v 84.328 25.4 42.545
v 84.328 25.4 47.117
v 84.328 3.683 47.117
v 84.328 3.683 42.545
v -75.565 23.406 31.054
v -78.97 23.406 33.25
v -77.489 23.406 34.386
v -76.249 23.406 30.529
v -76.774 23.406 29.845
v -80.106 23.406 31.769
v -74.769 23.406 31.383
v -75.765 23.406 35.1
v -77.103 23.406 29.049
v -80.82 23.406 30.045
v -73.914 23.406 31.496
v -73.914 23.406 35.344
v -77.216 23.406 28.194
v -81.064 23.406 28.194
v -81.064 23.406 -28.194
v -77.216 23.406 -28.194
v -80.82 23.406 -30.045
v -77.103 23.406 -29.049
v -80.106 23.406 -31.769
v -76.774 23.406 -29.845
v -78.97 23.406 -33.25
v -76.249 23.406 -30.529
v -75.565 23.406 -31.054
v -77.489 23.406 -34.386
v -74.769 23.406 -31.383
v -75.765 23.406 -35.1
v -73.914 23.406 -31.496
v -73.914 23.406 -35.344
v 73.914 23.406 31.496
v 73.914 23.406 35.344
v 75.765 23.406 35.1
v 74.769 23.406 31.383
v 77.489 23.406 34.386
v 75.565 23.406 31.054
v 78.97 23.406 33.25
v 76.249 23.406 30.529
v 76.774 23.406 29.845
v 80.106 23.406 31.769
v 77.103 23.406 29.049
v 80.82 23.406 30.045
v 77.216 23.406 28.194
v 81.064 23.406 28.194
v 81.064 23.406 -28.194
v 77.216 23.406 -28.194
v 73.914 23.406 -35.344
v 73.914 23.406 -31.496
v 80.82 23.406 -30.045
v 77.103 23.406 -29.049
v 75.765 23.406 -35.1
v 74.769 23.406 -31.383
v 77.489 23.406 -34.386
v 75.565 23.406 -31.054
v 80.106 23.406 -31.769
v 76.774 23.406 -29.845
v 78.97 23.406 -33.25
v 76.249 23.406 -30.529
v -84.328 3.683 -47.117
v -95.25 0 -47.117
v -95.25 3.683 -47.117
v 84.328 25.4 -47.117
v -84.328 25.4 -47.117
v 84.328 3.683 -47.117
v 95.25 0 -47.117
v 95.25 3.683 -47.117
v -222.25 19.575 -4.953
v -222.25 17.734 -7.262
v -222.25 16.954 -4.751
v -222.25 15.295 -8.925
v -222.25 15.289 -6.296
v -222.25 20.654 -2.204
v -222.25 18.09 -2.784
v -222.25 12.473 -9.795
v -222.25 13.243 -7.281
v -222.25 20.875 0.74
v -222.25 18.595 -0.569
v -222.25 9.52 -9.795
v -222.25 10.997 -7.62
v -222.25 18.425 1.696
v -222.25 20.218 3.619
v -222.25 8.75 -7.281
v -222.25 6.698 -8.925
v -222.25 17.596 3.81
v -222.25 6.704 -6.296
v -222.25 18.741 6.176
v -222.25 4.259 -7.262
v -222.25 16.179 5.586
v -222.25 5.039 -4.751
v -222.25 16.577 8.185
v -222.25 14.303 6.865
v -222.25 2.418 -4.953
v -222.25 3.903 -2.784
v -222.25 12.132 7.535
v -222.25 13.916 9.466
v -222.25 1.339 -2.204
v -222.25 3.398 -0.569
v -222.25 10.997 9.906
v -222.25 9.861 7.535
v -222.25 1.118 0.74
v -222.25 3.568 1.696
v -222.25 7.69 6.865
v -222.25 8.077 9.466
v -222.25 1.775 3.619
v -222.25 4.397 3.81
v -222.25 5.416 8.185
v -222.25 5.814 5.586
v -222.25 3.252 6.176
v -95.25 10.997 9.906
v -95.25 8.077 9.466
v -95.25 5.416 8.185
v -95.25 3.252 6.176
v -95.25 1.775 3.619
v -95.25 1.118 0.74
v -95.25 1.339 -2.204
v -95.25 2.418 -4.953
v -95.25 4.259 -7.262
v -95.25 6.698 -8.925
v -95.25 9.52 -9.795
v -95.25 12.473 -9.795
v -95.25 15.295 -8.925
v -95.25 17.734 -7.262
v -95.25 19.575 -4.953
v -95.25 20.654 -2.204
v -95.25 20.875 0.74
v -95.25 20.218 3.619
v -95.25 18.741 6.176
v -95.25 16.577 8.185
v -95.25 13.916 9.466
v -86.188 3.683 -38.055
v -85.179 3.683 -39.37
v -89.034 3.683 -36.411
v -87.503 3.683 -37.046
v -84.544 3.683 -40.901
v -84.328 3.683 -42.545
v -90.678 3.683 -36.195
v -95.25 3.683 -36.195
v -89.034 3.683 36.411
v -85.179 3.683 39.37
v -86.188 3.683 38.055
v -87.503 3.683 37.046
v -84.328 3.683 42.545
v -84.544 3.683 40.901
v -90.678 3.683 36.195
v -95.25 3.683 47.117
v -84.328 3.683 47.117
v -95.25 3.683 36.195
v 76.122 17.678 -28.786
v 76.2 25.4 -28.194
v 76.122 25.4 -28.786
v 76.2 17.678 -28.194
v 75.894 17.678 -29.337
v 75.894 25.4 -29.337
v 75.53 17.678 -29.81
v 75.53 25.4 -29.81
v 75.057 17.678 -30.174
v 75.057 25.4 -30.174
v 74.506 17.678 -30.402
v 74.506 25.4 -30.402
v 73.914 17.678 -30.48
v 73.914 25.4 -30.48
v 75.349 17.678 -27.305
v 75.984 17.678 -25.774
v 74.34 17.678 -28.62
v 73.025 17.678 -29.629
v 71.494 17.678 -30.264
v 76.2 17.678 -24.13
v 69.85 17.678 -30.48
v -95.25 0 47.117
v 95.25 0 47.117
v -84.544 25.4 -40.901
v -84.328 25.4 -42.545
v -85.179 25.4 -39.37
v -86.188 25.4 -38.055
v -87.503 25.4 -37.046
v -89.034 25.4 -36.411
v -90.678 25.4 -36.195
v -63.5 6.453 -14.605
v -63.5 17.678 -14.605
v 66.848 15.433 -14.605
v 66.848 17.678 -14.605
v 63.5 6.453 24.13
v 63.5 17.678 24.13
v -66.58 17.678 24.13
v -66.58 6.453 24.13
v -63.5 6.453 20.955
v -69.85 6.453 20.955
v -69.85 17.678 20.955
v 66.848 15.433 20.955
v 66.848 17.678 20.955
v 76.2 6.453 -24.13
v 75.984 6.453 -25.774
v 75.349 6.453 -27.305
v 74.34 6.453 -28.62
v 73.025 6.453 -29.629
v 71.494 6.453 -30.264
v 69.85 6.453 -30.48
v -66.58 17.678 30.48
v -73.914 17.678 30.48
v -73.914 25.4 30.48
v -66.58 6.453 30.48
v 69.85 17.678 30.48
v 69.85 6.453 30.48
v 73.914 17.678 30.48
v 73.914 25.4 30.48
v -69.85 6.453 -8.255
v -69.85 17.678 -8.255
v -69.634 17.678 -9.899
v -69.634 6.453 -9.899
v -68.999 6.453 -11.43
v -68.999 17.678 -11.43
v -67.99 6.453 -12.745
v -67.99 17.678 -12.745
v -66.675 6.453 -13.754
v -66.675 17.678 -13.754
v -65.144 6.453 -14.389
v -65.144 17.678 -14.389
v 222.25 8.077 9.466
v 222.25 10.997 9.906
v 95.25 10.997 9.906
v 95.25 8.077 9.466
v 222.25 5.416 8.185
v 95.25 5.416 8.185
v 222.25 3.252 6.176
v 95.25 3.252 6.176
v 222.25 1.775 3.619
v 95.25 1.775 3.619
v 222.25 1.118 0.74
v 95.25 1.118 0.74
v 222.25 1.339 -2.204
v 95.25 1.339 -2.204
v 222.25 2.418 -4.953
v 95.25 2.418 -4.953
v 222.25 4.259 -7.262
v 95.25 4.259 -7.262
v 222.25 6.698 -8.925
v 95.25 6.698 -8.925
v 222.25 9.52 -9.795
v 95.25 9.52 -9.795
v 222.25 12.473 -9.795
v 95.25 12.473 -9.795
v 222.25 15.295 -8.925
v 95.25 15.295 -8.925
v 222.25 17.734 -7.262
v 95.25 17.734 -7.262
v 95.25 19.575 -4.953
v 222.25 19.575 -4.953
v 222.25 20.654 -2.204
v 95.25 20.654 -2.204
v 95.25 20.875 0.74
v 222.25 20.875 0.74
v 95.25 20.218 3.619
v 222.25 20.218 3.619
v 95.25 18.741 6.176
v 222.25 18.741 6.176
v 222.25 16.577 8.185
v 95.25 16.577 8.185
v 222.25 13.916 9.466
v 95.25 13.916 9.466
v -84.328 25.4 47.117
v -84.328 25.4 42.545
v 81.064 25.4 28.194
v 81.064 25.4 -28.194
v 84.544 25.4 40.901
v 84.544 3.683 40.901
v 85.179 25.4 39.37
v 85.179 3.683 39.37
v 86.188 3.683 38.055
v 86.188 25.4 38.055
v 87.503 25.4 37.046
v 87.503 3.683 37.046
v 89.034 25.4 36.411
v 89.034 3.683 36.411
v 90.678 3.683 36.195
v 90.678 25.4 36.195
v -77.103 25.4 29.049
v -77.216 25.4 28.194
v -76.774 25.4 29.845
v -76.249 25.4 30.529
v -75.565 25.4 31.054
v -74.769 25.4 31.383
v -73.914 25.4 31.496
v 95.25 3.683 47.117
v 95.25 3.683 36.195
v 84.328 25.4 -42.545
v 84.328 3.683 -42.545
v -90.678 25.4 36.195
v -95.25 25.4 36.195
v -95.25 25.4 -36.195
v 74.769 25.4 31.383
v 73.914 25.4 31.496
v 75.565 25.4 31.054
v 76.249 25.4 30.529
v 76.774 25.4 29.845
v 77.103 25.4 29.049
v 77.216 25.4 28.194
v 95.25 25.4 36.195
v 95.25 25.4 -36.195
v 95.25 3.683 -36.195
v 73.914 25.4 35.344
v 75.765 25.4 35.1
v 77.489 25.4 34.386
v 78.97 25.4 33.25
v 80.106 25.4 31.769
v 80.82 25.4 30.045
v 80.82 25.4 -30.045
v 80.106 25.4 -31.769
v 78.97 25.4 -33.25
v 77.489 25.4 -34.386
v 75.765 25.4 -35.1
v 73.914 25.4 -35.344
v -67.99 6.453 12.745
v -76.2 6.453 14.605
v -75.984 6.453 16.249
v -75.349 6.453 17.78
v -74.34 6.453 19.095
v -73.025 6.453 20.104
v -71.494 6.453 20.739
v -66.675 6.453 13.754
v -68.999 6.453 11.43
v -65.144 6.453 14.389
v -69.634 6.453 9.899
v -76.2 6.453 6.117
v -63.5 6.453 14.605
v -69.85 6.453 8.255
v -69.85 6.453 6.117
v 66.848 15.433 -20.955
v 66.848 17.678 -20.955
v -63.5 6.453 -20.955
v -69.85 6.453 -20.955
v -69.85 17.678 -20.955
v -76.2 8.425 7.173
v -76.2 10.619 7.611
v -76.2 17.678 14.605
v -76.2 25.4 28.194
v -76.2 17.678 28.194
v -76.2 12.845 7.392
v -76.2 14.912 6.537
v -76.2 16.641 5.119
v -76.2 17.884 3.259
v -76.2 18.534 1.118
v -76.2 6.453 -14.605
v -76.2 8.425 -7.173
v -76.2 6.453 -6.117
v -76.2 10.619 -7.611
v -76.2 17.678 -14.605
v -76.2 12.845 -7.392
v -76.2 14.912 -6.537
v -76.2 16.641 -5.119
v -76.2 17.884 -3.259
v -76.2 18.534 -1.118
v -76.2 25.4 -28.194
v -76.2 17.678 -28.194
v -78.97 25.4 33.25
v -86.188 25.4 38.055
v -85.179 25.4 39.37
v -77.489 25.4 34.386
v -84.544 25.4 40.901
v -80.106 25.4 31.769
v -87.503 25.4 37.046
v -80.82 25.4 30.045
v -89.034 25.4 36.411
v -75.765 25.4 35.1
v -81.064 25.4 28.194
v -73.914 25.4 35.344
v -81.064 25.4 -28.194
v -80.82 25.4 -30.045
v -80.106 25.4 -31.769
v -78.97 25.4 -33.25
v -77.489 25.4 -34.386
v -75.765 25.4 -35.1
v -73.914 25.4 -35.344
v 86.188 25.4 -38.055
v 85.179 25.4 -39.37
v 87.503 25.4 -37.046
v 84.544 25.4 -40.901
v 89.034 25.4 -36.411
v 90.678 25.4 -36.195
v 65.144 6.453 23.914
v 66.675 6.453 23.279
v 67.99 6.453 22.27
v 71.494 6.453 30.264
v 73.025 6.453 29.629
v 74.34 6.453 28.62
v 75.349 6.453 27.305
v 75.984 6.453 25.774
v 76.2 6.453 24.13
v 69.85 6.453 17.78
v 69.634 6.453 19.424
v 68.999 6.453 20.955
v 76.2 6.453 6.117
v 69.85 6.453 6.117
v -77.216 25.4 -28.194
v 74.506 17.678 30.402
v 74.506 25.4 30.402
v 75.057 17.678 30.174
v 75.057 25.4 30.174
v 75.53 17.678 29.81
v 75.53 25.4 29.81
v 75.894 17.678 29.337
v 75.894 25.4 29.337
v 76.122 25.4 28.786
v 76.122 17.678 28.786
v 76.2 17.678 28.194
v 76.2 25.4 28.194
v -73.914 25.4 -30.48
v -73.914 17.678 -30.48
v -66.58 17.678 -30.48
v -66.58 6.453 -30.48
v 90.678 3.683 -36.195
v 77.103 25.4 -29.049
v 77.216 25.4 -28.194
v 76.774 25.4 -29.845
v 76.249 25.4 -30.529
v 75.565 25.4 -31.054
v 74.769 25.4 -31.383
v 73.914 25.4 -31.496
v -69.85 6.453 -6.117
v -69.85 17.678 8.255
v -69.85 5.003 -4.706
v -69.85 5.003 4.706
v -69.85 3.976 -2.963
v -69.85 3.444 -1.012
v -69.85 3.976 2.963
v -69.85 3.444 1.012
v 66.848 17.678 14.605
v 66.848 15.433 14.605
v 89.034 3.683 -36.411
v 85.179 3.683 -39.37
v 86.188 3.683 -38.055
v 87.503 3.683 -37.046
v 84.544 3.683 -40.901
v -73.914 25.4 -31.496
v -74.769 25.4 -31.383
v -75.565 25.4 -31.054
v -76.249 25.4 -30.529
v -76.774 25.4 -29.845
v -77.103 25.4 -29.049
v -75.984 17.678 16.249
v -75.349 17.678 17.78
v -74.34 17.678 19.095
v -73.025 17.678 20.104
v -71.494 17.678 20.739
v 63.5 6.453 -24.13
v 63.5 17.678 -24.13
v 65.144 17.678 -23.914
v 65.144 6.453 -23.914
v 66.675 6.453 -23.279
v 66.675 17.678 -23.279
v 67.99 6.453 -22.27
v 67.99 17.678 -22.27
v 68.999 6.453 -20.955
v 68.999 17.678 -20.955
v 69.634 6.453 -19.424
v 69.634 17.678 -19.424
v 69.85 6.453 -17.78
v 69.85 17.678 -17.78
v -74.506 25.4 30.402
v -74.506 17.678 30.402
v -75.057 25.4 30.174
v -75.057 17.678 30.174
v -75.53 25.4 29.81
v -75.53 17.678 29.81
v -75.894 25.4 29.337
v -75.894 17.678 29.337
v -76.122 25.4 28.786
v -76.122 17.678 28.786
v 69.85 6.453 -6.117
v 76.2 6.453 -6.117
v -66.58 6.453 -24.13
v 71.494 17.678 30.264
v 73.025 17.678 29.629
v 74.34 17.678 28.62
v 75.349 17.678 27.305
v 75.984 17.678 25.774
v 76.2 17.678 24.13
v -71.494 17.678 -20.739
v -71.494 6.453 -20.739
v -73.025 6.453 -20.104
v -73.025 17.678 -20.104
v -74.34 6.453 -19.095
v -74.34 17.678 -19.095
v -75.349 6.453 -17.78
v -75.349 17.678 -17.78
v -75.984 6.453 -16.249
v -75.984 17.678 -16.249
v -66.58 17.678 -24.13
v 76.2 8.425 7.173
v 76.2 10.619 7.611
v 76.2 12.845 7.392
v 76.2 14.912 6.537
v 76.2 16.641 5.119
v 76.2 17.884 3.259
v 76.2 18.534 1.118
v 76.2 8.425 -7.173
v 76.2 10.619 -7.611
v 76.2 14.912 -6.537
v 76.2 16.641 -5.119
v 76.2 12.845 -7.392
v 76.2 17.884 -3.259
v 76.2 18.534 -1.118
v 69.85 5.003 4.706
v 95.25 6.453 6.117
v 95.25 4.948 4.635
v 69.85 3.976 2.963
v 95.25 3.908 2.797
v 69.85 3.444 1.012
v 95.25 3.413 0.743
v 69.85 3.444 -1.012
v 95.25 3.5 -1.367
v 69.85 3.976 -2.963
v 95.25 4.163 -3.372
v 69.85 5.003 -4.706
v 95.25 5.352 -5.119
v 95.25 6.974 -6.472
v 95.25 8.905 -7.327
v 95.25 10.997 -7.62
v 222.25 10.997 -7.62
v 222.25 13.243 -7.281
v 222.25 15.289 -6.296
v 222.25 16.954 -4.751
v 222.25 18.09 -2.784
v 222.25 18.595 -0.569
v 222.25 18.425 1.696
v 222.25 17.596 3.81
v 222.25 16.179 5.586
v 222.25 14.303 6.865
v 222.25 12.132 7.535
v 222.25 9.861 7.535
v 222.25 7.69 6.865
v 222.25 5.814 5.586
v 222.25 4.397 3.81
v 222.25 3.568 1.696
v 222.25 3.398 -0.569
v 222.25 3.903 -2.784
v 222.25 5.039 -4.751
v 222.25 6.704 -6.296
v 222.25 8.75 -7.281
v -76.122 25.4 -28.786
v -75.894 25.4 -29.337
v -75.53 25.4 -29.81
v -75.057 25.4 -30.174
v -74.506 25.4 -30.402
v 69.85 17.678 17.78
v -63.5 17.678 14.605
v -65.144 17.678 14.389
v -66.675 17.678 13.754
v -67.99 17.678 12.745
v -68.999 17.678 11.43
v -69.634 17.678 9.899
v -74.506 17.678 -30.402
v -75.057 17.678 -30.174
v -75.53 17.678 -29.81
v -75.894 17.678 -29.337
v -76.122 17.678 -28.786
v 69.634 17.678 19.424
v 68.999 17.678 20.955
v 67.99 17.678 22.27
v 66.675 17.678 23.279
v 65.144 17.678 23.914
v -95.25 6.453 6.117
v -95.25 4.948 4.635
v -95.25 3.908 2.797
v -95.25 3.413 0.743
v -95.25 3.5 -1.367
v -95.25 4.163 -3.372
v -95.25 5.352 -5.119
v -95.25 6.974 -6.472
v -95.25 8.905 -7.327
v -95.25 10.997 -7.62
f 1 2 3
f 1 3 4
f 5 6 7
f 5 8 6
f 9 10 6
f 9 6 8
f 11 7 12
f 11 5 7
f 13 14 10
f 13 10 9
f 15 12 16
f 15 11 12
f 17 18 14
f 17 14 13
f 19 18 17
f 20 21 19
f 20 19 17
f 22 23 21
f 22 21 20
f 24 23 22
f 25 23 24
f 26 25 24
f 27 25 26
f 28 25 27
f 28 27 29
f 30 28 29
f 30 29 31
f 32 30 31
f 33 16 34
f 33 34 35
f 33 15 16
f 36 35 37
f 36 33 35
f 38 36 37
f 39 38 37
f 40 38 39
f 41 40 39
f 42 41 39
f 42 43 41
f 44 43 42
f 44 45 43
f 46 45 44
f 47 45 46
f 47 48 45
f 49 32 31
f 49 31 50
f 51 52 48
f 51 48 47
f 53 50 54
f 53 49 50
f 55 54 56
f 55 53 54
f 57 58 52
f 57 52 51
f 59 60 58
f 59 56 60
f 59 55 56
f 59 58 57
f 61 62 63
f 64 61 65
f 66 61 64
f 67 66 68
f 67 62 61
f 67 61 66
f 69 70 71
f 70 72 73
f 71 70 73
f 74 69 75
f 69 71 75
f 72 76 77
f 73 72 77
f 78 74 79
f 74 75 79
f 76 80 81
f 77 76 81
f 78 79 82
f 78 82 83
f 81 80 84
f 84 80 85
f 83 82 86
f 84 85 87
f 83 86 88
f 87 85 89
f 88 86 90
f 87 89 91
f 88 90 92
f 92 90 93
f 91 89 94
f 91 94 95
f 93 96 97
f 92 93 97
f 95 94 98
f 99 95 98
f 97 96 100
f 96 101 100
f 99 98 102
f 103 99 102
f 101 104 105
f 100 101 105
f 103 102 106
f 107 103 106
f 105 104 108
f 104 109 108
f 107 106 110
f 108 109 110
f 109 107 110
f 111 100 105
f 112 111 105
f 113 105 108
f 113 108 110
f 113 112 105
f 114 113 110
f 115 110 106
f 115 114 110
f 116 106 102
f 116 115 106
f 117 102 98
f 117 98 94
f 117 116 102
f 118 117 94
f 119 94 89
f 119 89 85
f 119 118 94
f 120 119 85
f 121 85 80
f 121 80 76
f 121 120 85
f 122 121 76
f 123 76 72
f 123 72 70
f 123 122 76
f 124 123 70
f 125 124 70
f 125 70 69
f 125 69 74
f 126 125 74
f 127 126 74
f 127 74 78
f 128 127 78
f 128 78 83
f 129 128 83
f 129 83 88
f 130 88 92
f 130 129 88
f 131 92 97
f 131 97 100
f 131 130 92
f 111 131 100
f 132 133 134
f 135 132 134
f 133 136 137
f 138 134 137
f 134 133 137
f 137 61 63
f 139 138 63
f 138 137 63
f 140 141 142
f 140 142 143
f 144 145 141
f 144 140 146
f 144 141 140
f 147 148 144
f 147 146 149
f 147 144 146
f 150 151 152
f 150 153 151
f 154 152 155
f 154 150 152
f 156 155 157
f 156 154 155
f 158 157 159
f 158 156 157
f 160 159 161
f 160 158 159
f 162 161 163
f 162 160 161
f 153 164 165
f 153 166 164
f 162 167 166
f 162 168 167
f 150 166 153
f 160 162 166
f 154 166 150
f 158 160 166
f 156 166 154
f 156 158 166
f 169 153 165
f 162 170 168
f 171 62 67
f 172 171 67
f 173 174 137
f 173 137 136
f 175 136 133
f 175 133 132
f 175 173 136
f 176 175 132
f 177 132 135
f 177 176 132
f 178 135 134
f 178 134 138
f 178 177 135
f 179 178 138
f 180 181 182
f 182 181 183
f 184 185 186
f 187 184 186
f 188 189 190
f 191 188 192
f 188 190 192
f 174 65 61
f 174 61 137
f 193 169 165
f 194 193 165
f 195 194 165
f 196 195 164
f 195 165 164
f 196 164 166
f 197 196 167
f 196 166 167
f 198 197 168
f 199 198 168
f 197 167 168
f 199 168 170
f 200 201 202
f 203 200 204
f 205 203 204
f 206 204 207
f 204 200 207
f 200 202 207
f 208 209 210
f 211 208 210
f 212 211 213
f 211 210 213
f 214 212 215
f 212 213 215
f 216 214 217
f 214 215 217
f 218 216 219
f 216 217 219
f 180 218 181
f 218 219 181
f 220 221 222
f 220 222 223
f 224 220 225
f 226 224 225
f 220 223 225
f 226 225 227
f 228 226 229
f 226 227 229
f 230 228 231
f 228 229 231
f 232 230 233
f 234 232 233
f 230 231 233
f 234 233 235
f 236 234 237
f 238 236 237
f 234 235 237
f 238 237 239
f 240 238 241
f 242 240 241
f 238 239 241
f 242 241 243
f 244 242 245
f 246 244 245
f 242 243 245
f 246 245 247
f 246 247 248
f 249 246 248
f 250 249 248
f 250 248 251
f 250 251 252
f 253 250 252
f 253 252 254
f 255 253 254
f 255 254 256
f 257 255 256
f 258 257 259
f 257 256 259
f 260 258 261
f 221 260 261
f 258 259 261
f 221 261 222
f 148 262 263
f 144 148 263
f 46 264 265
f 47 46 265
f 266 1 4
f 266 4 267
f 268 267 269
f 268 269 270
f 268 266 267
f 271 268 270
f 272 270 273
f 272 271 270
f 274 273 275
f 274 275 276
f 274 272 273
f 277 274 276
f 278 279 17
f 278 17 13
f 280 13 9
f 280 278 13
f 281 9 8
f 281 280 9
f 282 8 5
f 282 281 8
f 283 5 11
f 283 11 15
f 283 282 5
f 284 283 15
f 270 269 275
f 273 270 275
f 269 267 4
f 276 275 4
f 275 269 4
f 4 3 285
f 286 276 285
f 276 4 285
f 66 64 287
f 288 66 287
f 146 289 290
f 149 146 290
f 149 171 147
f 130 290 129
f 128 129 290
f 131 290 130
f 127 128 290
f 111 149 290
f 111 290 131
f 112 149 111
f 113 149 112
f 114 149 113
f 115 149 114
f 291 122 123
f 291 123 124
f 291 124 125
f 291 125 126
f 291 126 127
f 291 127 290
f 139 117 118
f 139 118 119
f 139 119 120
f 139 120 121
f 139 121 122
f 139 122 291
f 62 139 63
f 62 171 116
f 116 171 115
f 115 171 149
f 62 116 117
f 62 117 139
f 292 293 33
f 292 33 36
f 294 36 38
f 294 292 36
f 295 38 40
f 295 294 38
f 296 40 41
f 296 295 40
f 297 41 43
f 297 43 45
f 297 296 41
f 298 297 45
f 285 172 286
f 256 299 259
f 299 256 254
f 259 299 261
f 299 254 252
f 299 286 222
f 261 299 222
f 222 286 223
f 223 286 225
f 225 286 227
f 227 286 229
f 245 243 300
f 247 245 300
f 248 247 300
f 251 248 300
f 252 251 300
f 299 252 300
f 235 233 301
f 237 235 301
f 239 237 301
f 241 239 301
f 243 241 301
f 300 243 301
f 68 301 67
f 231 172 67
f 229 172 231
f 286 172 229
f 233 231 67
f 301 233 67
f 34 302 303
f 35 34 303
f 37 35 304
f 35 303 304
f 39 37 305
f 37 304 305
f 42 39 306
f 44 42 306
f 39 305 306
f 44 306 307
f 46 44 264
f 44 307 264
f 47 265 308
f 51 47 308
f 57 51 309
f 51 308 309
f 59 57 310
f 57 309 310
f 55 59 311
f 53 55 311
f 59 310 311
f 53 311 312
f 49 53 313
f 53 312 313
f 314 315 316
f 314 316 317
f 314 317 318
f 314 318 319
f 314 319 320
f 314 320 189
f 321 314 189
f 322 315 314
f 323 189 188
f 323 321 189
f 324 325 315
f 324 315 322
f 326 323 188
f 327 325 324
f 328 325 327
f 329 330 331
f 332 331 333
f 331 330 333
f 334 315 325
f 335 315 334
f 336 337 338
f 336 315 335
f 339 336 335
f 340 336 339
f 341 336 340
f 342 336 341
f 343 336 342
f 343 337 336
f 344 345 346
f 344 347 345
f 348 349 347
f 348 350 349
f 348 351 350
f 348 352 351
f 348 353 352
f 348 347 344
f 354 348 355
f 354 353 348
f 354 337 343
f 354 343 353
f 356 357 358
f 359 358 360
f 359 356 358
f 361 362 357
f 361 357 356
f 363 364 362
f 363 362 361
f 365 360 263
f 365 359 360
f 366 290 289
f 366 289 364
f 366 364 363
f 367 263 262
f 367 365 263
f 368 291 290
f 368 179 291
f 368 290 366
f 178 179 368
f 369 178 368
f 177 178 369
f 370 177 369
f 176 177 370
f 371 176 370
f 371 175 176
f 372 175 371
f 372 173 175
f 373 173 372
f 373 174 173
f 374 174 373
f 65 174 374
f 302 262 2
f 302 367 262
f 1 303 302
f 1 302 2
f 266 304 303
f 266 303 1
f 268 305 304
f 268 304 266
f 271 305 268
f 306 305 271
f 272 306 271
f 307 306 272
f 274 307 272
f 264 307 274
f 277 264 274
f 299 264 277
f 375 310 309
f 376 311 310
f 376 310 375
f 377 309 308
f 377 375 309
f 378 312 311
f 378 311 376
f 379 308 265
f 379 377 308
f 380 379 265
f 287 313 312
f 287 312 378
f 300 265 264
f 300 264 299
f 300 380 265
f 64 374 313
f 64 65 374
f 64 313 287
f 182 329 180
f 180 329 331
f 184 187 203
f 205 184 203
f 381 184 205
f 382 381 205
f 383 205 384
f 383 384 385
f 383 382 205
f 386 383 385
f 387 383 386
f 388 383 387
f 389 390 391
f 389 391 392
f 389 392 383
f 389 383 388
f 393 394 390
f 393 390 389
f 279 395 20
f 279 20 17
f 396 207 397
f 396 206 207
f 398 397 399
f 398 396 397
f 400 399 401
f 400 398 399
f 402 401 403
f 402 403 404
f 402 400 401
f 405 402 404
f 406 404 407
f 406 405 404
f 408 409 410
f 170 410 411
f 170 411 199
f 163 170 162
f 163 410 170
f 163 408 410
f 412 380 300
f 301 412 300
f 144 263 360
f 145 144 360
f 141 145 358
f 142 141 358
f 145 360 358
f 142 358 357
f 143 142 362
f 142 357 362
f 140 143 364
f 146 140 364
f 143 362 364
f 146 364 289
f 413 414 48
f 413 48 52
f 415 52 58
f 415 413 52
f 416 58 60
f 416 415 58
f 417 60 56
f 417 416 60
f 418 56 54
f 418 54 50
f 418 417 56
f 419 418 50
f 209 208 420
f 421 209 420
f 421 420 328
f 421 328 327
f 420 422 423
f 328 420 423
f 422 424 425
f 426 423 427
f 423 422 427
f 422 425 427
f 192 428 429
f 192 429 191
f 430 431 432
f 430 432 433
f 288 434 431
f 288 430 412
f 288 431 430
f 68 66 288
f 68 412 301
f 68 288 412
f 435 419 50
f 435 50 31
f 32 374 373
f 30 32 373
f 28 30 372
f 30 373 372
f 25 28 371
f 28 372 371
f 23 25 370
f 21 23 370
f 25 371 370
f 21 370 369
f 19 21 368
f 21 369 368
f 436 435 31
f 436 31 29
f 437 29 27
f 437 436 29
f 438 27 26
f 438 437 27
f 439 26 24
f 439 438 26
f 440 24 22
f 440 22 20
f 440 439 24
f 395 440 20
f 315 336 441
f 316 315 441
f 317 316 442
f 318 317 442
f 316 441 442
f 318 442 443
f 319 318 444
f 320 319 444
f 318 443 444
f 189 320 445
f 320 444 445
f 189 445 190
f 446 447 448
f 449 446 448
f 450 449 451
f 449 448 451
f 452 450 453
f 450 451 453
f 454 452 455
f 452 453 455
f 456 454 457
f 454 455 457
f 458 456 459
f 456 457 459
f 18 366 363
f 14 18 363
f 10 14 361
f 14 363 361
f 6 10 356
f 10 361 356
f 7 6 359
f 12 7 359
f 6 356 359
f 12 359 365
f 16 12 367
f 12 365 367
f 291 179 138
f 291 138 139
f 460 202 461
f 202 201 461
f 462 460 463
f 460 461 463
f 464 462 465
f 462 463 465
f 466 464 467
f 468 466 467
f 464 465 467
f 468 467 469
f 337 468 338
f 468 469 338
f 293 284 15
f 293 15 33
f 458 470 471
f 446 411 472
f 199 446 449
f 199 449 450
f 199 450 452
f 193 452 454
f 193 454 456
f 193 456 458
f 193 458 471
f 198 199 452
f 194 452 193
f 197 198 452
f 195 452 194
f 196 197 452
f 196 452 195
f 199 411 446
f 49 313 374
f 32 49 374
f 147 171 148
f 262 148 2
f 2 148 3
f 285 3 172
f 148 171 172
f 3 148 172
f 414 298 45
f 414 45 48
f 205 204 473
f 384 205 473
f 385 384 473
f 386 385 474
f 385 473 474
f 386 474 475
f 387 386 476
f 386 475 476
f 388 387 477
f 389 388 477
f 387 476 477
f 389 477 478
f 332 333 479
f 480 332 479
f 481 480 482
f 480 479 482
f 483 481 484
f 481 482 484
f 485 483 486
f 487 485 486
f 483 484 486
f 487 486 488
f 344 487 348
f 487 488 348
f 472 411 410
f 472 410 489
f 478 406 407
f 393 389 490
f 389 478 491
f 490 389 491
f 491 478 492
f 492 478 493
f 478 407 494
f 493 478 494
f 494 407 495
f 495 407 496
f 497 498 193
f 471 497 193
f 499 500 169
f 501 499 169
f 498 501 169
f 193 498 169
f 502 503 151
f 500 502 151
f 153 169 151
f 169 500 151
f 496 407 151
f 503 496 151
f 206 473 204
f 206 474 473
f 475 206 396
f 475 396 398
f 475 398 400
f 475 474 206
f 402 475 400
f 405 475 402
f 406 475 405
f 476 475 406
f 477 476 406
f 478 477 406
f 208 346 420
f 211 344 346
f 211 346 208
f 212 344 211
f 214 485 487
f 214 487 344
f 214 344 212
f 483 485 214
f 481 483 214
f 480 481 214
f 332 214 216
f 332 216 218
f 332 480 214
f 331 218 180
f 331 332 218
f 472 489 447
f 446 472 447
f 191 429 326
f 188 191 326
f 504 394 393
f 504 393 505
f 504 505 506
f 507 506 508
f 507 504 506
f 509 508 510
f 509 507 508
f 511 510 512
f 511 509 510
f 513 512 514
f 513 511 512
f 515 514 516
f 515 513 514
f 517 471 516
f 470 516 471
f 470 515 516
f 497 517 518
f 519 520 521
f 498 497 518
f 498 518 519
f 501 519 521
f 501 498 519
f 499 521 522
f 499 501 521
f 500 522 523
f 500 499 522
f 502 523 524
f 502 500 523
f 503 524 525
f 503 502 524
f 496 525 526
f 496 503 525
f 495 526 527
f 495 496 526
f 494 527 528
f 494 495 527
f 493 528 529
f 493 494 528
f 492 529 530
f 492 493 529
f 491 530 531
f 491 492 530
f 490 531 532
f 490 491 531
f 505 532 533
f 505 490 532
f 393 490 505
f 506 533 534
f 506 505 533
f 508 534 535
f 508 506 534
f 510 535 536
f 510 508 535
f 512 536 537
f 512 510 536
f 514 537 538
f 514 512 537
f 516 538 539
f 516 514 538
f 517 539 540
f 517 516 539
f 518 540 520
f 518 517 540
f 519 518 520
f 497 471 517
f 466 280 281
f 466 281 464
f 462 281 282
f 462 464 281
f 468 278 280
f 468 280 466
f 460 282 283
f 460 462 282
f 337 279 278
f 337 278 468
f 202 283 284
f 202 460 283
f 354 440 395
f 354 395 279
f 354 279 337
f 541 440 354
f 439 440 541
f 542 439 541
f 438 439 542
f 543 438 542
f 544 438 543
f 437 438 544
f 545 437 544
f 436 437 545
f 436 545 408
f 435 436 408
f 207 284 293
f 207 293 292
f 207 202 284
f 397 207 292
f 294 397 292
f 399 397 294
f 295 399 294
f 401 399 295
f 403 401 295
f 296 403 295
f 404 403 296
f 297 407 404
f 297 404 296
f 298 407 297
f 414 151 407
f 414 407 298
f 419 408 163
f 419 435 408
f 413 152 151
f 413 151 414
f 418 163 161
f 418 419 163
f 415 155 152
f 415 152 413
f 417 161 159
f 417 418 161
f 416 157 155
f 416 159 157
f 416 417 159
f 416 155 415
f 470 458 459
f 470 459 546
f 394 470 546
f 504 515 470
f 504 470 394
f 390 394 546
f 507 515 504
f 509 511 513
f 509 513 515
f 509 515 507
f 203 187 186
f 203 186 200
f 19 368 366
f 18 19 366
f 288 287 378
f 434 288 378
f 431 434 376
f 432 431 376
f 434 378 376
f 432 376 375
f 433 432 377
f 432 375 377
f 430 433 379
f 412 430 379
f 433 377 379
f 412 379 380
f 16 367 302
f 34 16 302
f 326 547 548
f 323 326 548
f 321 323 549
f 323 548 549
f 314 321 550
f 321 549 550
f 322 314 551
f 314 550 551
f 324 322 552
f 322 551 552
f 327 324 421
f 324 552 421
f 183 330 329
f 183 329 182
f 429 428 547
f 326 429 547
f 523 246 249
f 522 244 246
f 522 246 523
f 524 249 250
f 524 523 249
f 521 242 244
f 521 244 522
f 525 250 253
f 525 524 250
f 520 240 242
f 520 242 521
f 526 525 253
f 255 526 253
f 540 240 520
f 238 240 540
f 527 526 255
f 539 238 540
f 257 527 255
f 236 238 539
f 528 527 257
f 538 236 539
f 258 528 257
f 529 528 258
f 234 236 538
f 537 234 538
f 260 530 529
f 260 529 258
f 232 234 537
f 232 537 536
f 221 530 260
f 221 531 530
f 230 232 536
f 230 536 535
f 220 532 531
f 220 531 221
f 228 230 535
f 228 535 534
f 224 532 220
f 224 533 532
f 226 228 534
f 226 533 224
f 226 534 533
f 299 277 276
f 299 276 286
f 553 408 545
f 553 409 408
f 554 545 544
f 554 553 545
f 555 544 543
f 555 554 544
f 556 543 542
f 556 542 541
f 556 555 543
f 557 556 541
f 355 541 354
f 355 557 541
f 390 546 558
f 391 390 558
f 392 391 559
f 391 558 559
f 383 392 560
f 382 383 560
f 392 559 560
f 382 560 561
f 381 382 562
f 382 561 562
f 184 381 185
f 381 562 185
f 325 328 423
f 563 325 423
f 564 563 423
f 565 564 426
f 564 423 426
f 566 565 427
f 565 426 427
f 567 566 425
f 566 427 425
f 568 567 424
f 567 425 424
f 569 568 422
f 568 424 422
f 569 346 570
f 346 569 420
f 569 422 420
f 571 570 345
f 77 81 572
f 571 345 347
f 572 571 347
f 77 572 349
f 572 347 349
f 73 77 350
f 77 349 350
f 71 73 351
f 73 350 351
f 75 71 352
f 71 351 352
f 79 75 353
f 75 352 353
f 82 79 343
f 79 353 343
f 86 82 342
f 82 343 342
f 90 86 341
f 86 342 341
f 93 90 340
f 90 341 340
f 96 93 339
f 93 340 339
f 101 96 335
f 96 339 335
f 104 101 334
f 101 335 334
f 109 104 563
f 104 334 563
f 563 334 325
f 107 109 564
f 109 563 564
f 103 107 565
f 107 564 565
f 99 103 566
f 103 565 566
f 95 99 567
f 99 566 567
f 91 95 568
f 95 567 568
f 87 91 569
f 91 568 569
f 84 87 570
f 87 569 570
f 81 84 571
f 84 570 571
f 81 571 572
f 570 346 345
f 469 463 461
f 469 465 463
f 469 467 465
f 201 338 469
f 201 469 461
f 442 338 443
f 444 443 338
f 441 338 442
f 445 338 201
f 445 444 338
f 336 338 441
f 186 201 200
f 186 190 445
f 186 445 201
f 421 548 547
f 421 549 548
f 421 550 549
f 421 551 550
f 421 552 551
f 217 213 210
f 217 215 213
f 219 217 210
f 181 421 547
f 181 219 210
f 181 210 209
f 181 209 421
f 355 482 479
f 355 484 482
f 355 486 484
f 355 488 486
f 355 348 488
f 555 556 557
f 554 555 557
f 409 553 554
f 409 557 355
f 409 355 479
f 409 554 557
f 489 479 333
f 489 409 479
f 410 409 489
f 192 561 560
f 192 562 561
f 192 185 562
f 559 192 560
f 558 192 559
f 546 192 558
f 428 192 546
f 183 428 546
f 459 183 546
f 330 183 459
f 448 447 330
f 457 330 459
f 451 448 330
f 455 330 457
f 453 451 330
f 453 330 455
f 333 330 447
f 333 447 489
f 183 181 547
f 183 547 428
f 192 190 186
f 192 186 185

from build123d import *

# Parameters (mm, degrees)
SKETCH2_W                                = 190.5
SKETCH2_H                                = 94.234
BOSS_EXTRUDE1_DEPTH                      = 25.4
SKETCH3_W                                = 152.4
SKETCH3_H                                = 60.96
CUT_EXTRUDE1_DEPTH                       = 7.7216
FILLET1_R                                = 2.286
CUT_EXTRUDE2_DEPTH                       = 1.9939
CUT_EXTRUDE3_DEPTH                       = 21.717
MIRROR1_AT_THE_SECOND_PLANE_COPY_1_DEPTH = 21.717
CUT_EXTRUDE6_DEPTH                       = 11.22531918
SKETCH10_R                               = 9.906
SKETCH10_R_2                             = 7.62
BOSS_EXTRUDE2_DEPTH                      = 127
CUT_EXTRUDE9_START                       = -25.4
SKETCH16_R                               = 7.62
CUT_EXTRUDE9_DEPTH                       = 25.4
BOSS_EXTRUDE3_REACH                      = 235.825


with BuildPart() as part:
    # Sketch2 → Boss-Extrude1 (new body)
    with BuildSketch(Plane(origin=(0, 0, 0), x_dir=(1, 0, 0), z_dir=(0, 1, 0))):
        Rectangle(SKETCH2_W, SKETCH2_H)
    extrude(amount=BOSS_EXTRUDE1_DEPTH)

    # Sketch3 → Cut-Extrude1 (cut)
    with BuildSketch(Plane(origin=(0, 25.4, 0), x_dir=(1, 0, 0), z_dir=(0, 1, 0))):
        Rectangle(SKETCH3_W, SKETCH3_H)
    extrude(amount=-CUT_EXTRUDE1_DEPTH, mode=Mode.SUBTRACT)

    # Fillet1
    fillet1_edges = [part.edges().sort_by_distance(p)[0] for p in [
        (76.2, 21.5392, -30.48),
        (76.2, 21.5392, 30.48),
        (-76.2, 21.5392, 30.48),
        (-76.2, 21.5392, -30.48),
    ]]
    fillet(fillet1_edges, radius=FILLET1_R)

    # Sketch5 → Cut-Extrude2 (cut)
    with BuildSketch(Plane(origin=(0, 25.4, 0), x_dir=(1, 0, 0), z_dir=(0, 1, 0))):
        with BuildLine():
            Line((-73.914, -35.3441), (73.914, -35.3441))
            ThreePointArc((73.914, -35.3441), (78.969884196, -33.249884196), (81.0641, -28.194))
            Line((81.0641, -28.194), (81.0641, 28.194))
            ThreePointArc((81.0641, 28.194), (78.969884196, 33.249884196), (73.914, 35.3441))
            Line((73.914, 35.3441), (-73.914, 35.3441))
            ThreePointArc((-73.914, 35.3441), (-78.969884196, 33.249884196), (-81.0641, 28.194))
            Line((-81.0641, 28.194), (-81.0641, -28.194))
            ThreePointArc((-81.0641, -28.194), (-78.969884196, -33.249884196), (-73.914, -35.3441))
        make_face()
        with BuildLine():
            Line((-73.914, -31.496), (73.914, -31.496))
            ThreePointArc((73.914, -31.496), (76.248866591, -30.528866591), (77.216, -28.194))
            Line((77.216, -28.194), (77.216, 28.194))
            ThreePointArc((77.216, 28.194), (76.248866591, 30.528866591), (73.914, 31.496))
            Line((73.914, 31.496), (-73.914, 31.496))
            ThreePointArc((-73.914, 31.496), (-76.248866591, 30.528866591), (-77.216, 28.194))
            Line((-77.216, 28.194), (-77.216, -28.194))
            ThreePointArc((-77.216, -28.194), (-76.248866591, -30.528866591), (-73.914, -31.496))
        make_face(mode=Mode.SUBTRACT)
    extrude(amount=-CUT_EXTRUDE2_DEPTH, mode=Mode.SUBTRACT)

    # Sketch6 → Cut-Extrude3 (cut)
    with BuildSketch(Plane(origin=(0, 25.4, 0), x_dir=(1, 0, 0), z_dir=(0, 1, 0))):
        with BuildLine():
            Line((-84.328, 47.117), (-84.328, 42.545))
            ThreePointArc((-84.328, 42.545), (-86.187871939, 38.054871939), (-90.678, 36.195))
            Line((-90.678, 36.195), (-95.25, 36.195))
            Line((-95.25, 36.195), (-95.25, 47.117))
            Line((-95.25, 47.117), (-84.328, 47.117))
        make_face()
    cut_extrude3 = extrude(amount=-CUT_EXTRUDE3_DEPTH, mode=Mode.SUBTRACT)

    # Mirror1: Cut-Extrude3 across plane
    add(cut_extrude3.mirror(Plane(origin=(0, 0, 0), x_dir=(0, 0, 1), z_dir=(1, 0, 0))), mode=Mode.SUBTRACT)

    # Mirror1 at the second plane: Cut-Extrude3 across plane
    add(cut_extrude3.mirror(Plane.XY), mode=Mode.SUBTRACT)

    # Mirror1 at the second plane copy 1 sketc → Mirror1 at the second plane copy 1 (cut)
    with BuildSketch(Plane(origin=(0, 25.4, 0), x_dir=(-1, 0, 0), z_dir=(0, 1, 0))):
        with BuildLine():
            Line((-84.328, 47.117), (-84.328, 42.545))
            ThreePointArc((-84.328, 42.545), (-86.187871939, 38.054871939), (-90.678, 36.195))
            Line((-90.678, 36.195), (-95.25, 36.195))
            Line((-95.25, 36.195), (-95.25, 47.117))
            Line((-95.25, 47.117), (-84.328, 47.117))
        make_face()
    extrude(amount=-MIRROR1_AT_THE_SECOND_PLANE_COPY_1_DEPTH, mode=Mode.SUBTRACT)

    # Sketch13 → Cut-Extrude6 (cut)
    with BuildSketch(Plane(origin=(0, 17.6784, 0), x_dir=(1, 0, 0), z_dir=(0, 1, 0))):
        with BuildLine():
            Line((-63.000000018, 24.13), (63.5, 24.13))
            ThreePointArc((63.5, 24.13), (67.990128061, 22.270128061), (69.85, 17.78))
            Line((69.85, 17.78), (69.85, -17.78))
            ThreePointArc((69.85, -17.78), (67.990128061, -22.270128061), (63.5, -24.13))
            Line((63.5, -24.13), (-63.000000018, -24.13))
            ThreePointArc((-63.000000018, -24.13), (-66.175000018, -27.305), (-63.000000018, -30.48))
            Line((-63.000000018, -30.48), (69.85, -30.48))
            ThreePointArc((69.85, -30.48), (74.340128061, -28.620128061), (76.2, -24.13))
            Line((76.2, -24.13), (76.2, 24.13))
            ThreePointArc((76.2, 24.13), (74.340128061, 28.620128061), (69.85, 30.48))
            Line((69.85, 30.48), (-63.000000018, 30.48))
            ThreePointArc((-63.000000018, 30.48), (-66.175000018, 27.305), (-63.000000018, 24.13))
        make_face()
        with BuildLine():
            Line((-66.580399175, 24.13), (-63.000000018, 24.13))
            ThreePointArc((-63.000000018, 24.13), (-66.175000018, 27.305), (-63.000000018, 30.48))
            Line((-63.000000018, 30.48), (-66.580399175, 30.48))
            Line((-66.580399175, 30.48), (-66.580399175, 24.13))
        make_face()
        with BuildLine():
            Line((-76.2, 14.605), (-76.2, -14.605))
            ThreePointArc((-76.2, -14.605), (-74.340128061, -19.095128061), (-69.85, -20.955))
            Line((-69.85, -20.955), (63.000000018, -20.955))
            ThreePointArc((63.000000018, -20.955), (66.175000018, -17.78), (63.000000018, -14.605))
            Line((63.000000018, -14.605), (-63.5, -14.605))
            ThreePointArc((-63.5, -14.605), (-67.990128061, -12.745128061), (-69.85, -8.255))
            Line((-69.85, -8.255), (-69.85, 8.255))
            ThreePointArc((-69.85, 8.255), (-67.990128061, 12.745128061), (-63.5, 14.605))
            Line((-63.5, 14.605), (63.000000018, 14.605))
            ThreePointArc((63.000000018, 14.605), (66.175000018, 17.78), (63.000000018, 20.955))
            Line((63.000000018, 20.955), (-69.85, 20.955))
            ThreePointArc((-69.85, 20.955), (-74.340128061, 19.095128061), (-76.2, 14.605))
        make_face()
        with BuildLine():
            Line((63.000000018, 20.955), (66.84830001, 20.955))
            Line((66.84830001, 20.955), (66.84830001, 14.605))
            Line((66.84830001, 14.605), (63.000000018, 14.605))
            ThreePointArc((63.000000018, 14.605), (66.175000018, 17.78), (63.000000018, 20.955))
        make_face()
        with BuildLine():
            ThreePointArc((63.000000018, -20.955), (66.175000018, -17.78), (63.000000018, -14.605))
            Line((63.000000018, -14.605), (66.84830001, -14.605))
            Line((66.84830001, -14.605), (66.84830001, -20.955))
            Line((66.84830001, -20.955), (63.000000018, -20.955))
        make_face()
        with BuildLine():
            ThreePointArc((-63.000000018, -30.48), (-66.175000018, -27.305), (-63.000000018, -24.13))
            Line((-63.000000018, -24.13), (-66.580399175, -24.13))
            Line((-66.580399175, -24.13), (-66.580399175, -30.48))
            Line((-66.580399175, -30.48), (-63.000000018, -30.48))
        make_face()
    extrude(amount=-CUT_EXTRUDE6_DEPTH, mode=Mode.SUBTRACT)

    # Sketch10 → Boss-Extrude2 (add)
    with BuildSketch(Plane(origin=(95.25, 0, 0), x_dir=(0, 0, -1), z_dir=(1, 0, 0))):
        with Locations(Location((0, 10.996509823, 0), (0, 0, 180))):
            Circle(SKETCH10_R)
        with Locations((0, 10.996509823)):
            Circle(SKETCH10_R_2, mode=Mode.SUBTRACT)
    boss_extrude2 = extrude(amount=BOSS_EXTRUDE2_DEPTH)

    # Sketch16 → Cut-Extrude9 (cut)
    with BuildSketch(Plane(origin=(95.25, 0, 0), x_dir=(0, 0, -1), z_dir=(1, 0, 0)).offset(CUT_EXTRUDE9_START)):
        with Locations(Location((0, 10.996509823, 0), (0, 0, 216.601830643))):
            Circle(SKETCH16_R)
    cut_extrude9 = extrude(amount=CUT_EXTRUDE9_DEPTH, mode=Mode.SUBTRACT)

    # Mirror2: Boss-Extrude2, Cut-Extrude9 across plane
    add(boss_extrude2.mirror(Plane(origin=(0, 0, 0), x_dir=(0, 0, 1), z_dir=(1, 0, 0))))
    add(cut_extrude9.mirror(Plane(origin=(0, 0, 0), x_dir=(0, 0, 1), z_dir=(1, 0, 0))), mode=Mode.SUBTRACT)

    # Boss-Extrude3: up to this face of the body (flat: up to its plane)
    boss_extrude3_end = Plane(part.part.faces().sort_by_distance((-1.500849995, 12.06574041, 20.955))[0])
    # Sketch17 → Boss-Extrude3 (add, up to the picked face)
    with BuildSketch(Plane.XY.offset(-20.955), mode=Mode.PRIVATE) as boss_extrude3_sk1:
        Polygon((66.84830001, 6.45308082), (66.84830001, 15.43307302), (-63.5, 6.45308082), align=None)
    boss_extrude3_tool1 = split(extrude(boss_extrude3_sk1.sketch, amount=BOSS_EXTRUDE3_REACH, mode=Mode.PRIVATE), bisect_by=boss_extrude3_end, keep=Keep.BOTH, mode=Mode.PRIVATE)
    add(boss_extrude3_tool1.solids().sort_by(Axis((23.398867, 9.446412, -20.955), (0, 0, 1)))[0])


solid = part.part
